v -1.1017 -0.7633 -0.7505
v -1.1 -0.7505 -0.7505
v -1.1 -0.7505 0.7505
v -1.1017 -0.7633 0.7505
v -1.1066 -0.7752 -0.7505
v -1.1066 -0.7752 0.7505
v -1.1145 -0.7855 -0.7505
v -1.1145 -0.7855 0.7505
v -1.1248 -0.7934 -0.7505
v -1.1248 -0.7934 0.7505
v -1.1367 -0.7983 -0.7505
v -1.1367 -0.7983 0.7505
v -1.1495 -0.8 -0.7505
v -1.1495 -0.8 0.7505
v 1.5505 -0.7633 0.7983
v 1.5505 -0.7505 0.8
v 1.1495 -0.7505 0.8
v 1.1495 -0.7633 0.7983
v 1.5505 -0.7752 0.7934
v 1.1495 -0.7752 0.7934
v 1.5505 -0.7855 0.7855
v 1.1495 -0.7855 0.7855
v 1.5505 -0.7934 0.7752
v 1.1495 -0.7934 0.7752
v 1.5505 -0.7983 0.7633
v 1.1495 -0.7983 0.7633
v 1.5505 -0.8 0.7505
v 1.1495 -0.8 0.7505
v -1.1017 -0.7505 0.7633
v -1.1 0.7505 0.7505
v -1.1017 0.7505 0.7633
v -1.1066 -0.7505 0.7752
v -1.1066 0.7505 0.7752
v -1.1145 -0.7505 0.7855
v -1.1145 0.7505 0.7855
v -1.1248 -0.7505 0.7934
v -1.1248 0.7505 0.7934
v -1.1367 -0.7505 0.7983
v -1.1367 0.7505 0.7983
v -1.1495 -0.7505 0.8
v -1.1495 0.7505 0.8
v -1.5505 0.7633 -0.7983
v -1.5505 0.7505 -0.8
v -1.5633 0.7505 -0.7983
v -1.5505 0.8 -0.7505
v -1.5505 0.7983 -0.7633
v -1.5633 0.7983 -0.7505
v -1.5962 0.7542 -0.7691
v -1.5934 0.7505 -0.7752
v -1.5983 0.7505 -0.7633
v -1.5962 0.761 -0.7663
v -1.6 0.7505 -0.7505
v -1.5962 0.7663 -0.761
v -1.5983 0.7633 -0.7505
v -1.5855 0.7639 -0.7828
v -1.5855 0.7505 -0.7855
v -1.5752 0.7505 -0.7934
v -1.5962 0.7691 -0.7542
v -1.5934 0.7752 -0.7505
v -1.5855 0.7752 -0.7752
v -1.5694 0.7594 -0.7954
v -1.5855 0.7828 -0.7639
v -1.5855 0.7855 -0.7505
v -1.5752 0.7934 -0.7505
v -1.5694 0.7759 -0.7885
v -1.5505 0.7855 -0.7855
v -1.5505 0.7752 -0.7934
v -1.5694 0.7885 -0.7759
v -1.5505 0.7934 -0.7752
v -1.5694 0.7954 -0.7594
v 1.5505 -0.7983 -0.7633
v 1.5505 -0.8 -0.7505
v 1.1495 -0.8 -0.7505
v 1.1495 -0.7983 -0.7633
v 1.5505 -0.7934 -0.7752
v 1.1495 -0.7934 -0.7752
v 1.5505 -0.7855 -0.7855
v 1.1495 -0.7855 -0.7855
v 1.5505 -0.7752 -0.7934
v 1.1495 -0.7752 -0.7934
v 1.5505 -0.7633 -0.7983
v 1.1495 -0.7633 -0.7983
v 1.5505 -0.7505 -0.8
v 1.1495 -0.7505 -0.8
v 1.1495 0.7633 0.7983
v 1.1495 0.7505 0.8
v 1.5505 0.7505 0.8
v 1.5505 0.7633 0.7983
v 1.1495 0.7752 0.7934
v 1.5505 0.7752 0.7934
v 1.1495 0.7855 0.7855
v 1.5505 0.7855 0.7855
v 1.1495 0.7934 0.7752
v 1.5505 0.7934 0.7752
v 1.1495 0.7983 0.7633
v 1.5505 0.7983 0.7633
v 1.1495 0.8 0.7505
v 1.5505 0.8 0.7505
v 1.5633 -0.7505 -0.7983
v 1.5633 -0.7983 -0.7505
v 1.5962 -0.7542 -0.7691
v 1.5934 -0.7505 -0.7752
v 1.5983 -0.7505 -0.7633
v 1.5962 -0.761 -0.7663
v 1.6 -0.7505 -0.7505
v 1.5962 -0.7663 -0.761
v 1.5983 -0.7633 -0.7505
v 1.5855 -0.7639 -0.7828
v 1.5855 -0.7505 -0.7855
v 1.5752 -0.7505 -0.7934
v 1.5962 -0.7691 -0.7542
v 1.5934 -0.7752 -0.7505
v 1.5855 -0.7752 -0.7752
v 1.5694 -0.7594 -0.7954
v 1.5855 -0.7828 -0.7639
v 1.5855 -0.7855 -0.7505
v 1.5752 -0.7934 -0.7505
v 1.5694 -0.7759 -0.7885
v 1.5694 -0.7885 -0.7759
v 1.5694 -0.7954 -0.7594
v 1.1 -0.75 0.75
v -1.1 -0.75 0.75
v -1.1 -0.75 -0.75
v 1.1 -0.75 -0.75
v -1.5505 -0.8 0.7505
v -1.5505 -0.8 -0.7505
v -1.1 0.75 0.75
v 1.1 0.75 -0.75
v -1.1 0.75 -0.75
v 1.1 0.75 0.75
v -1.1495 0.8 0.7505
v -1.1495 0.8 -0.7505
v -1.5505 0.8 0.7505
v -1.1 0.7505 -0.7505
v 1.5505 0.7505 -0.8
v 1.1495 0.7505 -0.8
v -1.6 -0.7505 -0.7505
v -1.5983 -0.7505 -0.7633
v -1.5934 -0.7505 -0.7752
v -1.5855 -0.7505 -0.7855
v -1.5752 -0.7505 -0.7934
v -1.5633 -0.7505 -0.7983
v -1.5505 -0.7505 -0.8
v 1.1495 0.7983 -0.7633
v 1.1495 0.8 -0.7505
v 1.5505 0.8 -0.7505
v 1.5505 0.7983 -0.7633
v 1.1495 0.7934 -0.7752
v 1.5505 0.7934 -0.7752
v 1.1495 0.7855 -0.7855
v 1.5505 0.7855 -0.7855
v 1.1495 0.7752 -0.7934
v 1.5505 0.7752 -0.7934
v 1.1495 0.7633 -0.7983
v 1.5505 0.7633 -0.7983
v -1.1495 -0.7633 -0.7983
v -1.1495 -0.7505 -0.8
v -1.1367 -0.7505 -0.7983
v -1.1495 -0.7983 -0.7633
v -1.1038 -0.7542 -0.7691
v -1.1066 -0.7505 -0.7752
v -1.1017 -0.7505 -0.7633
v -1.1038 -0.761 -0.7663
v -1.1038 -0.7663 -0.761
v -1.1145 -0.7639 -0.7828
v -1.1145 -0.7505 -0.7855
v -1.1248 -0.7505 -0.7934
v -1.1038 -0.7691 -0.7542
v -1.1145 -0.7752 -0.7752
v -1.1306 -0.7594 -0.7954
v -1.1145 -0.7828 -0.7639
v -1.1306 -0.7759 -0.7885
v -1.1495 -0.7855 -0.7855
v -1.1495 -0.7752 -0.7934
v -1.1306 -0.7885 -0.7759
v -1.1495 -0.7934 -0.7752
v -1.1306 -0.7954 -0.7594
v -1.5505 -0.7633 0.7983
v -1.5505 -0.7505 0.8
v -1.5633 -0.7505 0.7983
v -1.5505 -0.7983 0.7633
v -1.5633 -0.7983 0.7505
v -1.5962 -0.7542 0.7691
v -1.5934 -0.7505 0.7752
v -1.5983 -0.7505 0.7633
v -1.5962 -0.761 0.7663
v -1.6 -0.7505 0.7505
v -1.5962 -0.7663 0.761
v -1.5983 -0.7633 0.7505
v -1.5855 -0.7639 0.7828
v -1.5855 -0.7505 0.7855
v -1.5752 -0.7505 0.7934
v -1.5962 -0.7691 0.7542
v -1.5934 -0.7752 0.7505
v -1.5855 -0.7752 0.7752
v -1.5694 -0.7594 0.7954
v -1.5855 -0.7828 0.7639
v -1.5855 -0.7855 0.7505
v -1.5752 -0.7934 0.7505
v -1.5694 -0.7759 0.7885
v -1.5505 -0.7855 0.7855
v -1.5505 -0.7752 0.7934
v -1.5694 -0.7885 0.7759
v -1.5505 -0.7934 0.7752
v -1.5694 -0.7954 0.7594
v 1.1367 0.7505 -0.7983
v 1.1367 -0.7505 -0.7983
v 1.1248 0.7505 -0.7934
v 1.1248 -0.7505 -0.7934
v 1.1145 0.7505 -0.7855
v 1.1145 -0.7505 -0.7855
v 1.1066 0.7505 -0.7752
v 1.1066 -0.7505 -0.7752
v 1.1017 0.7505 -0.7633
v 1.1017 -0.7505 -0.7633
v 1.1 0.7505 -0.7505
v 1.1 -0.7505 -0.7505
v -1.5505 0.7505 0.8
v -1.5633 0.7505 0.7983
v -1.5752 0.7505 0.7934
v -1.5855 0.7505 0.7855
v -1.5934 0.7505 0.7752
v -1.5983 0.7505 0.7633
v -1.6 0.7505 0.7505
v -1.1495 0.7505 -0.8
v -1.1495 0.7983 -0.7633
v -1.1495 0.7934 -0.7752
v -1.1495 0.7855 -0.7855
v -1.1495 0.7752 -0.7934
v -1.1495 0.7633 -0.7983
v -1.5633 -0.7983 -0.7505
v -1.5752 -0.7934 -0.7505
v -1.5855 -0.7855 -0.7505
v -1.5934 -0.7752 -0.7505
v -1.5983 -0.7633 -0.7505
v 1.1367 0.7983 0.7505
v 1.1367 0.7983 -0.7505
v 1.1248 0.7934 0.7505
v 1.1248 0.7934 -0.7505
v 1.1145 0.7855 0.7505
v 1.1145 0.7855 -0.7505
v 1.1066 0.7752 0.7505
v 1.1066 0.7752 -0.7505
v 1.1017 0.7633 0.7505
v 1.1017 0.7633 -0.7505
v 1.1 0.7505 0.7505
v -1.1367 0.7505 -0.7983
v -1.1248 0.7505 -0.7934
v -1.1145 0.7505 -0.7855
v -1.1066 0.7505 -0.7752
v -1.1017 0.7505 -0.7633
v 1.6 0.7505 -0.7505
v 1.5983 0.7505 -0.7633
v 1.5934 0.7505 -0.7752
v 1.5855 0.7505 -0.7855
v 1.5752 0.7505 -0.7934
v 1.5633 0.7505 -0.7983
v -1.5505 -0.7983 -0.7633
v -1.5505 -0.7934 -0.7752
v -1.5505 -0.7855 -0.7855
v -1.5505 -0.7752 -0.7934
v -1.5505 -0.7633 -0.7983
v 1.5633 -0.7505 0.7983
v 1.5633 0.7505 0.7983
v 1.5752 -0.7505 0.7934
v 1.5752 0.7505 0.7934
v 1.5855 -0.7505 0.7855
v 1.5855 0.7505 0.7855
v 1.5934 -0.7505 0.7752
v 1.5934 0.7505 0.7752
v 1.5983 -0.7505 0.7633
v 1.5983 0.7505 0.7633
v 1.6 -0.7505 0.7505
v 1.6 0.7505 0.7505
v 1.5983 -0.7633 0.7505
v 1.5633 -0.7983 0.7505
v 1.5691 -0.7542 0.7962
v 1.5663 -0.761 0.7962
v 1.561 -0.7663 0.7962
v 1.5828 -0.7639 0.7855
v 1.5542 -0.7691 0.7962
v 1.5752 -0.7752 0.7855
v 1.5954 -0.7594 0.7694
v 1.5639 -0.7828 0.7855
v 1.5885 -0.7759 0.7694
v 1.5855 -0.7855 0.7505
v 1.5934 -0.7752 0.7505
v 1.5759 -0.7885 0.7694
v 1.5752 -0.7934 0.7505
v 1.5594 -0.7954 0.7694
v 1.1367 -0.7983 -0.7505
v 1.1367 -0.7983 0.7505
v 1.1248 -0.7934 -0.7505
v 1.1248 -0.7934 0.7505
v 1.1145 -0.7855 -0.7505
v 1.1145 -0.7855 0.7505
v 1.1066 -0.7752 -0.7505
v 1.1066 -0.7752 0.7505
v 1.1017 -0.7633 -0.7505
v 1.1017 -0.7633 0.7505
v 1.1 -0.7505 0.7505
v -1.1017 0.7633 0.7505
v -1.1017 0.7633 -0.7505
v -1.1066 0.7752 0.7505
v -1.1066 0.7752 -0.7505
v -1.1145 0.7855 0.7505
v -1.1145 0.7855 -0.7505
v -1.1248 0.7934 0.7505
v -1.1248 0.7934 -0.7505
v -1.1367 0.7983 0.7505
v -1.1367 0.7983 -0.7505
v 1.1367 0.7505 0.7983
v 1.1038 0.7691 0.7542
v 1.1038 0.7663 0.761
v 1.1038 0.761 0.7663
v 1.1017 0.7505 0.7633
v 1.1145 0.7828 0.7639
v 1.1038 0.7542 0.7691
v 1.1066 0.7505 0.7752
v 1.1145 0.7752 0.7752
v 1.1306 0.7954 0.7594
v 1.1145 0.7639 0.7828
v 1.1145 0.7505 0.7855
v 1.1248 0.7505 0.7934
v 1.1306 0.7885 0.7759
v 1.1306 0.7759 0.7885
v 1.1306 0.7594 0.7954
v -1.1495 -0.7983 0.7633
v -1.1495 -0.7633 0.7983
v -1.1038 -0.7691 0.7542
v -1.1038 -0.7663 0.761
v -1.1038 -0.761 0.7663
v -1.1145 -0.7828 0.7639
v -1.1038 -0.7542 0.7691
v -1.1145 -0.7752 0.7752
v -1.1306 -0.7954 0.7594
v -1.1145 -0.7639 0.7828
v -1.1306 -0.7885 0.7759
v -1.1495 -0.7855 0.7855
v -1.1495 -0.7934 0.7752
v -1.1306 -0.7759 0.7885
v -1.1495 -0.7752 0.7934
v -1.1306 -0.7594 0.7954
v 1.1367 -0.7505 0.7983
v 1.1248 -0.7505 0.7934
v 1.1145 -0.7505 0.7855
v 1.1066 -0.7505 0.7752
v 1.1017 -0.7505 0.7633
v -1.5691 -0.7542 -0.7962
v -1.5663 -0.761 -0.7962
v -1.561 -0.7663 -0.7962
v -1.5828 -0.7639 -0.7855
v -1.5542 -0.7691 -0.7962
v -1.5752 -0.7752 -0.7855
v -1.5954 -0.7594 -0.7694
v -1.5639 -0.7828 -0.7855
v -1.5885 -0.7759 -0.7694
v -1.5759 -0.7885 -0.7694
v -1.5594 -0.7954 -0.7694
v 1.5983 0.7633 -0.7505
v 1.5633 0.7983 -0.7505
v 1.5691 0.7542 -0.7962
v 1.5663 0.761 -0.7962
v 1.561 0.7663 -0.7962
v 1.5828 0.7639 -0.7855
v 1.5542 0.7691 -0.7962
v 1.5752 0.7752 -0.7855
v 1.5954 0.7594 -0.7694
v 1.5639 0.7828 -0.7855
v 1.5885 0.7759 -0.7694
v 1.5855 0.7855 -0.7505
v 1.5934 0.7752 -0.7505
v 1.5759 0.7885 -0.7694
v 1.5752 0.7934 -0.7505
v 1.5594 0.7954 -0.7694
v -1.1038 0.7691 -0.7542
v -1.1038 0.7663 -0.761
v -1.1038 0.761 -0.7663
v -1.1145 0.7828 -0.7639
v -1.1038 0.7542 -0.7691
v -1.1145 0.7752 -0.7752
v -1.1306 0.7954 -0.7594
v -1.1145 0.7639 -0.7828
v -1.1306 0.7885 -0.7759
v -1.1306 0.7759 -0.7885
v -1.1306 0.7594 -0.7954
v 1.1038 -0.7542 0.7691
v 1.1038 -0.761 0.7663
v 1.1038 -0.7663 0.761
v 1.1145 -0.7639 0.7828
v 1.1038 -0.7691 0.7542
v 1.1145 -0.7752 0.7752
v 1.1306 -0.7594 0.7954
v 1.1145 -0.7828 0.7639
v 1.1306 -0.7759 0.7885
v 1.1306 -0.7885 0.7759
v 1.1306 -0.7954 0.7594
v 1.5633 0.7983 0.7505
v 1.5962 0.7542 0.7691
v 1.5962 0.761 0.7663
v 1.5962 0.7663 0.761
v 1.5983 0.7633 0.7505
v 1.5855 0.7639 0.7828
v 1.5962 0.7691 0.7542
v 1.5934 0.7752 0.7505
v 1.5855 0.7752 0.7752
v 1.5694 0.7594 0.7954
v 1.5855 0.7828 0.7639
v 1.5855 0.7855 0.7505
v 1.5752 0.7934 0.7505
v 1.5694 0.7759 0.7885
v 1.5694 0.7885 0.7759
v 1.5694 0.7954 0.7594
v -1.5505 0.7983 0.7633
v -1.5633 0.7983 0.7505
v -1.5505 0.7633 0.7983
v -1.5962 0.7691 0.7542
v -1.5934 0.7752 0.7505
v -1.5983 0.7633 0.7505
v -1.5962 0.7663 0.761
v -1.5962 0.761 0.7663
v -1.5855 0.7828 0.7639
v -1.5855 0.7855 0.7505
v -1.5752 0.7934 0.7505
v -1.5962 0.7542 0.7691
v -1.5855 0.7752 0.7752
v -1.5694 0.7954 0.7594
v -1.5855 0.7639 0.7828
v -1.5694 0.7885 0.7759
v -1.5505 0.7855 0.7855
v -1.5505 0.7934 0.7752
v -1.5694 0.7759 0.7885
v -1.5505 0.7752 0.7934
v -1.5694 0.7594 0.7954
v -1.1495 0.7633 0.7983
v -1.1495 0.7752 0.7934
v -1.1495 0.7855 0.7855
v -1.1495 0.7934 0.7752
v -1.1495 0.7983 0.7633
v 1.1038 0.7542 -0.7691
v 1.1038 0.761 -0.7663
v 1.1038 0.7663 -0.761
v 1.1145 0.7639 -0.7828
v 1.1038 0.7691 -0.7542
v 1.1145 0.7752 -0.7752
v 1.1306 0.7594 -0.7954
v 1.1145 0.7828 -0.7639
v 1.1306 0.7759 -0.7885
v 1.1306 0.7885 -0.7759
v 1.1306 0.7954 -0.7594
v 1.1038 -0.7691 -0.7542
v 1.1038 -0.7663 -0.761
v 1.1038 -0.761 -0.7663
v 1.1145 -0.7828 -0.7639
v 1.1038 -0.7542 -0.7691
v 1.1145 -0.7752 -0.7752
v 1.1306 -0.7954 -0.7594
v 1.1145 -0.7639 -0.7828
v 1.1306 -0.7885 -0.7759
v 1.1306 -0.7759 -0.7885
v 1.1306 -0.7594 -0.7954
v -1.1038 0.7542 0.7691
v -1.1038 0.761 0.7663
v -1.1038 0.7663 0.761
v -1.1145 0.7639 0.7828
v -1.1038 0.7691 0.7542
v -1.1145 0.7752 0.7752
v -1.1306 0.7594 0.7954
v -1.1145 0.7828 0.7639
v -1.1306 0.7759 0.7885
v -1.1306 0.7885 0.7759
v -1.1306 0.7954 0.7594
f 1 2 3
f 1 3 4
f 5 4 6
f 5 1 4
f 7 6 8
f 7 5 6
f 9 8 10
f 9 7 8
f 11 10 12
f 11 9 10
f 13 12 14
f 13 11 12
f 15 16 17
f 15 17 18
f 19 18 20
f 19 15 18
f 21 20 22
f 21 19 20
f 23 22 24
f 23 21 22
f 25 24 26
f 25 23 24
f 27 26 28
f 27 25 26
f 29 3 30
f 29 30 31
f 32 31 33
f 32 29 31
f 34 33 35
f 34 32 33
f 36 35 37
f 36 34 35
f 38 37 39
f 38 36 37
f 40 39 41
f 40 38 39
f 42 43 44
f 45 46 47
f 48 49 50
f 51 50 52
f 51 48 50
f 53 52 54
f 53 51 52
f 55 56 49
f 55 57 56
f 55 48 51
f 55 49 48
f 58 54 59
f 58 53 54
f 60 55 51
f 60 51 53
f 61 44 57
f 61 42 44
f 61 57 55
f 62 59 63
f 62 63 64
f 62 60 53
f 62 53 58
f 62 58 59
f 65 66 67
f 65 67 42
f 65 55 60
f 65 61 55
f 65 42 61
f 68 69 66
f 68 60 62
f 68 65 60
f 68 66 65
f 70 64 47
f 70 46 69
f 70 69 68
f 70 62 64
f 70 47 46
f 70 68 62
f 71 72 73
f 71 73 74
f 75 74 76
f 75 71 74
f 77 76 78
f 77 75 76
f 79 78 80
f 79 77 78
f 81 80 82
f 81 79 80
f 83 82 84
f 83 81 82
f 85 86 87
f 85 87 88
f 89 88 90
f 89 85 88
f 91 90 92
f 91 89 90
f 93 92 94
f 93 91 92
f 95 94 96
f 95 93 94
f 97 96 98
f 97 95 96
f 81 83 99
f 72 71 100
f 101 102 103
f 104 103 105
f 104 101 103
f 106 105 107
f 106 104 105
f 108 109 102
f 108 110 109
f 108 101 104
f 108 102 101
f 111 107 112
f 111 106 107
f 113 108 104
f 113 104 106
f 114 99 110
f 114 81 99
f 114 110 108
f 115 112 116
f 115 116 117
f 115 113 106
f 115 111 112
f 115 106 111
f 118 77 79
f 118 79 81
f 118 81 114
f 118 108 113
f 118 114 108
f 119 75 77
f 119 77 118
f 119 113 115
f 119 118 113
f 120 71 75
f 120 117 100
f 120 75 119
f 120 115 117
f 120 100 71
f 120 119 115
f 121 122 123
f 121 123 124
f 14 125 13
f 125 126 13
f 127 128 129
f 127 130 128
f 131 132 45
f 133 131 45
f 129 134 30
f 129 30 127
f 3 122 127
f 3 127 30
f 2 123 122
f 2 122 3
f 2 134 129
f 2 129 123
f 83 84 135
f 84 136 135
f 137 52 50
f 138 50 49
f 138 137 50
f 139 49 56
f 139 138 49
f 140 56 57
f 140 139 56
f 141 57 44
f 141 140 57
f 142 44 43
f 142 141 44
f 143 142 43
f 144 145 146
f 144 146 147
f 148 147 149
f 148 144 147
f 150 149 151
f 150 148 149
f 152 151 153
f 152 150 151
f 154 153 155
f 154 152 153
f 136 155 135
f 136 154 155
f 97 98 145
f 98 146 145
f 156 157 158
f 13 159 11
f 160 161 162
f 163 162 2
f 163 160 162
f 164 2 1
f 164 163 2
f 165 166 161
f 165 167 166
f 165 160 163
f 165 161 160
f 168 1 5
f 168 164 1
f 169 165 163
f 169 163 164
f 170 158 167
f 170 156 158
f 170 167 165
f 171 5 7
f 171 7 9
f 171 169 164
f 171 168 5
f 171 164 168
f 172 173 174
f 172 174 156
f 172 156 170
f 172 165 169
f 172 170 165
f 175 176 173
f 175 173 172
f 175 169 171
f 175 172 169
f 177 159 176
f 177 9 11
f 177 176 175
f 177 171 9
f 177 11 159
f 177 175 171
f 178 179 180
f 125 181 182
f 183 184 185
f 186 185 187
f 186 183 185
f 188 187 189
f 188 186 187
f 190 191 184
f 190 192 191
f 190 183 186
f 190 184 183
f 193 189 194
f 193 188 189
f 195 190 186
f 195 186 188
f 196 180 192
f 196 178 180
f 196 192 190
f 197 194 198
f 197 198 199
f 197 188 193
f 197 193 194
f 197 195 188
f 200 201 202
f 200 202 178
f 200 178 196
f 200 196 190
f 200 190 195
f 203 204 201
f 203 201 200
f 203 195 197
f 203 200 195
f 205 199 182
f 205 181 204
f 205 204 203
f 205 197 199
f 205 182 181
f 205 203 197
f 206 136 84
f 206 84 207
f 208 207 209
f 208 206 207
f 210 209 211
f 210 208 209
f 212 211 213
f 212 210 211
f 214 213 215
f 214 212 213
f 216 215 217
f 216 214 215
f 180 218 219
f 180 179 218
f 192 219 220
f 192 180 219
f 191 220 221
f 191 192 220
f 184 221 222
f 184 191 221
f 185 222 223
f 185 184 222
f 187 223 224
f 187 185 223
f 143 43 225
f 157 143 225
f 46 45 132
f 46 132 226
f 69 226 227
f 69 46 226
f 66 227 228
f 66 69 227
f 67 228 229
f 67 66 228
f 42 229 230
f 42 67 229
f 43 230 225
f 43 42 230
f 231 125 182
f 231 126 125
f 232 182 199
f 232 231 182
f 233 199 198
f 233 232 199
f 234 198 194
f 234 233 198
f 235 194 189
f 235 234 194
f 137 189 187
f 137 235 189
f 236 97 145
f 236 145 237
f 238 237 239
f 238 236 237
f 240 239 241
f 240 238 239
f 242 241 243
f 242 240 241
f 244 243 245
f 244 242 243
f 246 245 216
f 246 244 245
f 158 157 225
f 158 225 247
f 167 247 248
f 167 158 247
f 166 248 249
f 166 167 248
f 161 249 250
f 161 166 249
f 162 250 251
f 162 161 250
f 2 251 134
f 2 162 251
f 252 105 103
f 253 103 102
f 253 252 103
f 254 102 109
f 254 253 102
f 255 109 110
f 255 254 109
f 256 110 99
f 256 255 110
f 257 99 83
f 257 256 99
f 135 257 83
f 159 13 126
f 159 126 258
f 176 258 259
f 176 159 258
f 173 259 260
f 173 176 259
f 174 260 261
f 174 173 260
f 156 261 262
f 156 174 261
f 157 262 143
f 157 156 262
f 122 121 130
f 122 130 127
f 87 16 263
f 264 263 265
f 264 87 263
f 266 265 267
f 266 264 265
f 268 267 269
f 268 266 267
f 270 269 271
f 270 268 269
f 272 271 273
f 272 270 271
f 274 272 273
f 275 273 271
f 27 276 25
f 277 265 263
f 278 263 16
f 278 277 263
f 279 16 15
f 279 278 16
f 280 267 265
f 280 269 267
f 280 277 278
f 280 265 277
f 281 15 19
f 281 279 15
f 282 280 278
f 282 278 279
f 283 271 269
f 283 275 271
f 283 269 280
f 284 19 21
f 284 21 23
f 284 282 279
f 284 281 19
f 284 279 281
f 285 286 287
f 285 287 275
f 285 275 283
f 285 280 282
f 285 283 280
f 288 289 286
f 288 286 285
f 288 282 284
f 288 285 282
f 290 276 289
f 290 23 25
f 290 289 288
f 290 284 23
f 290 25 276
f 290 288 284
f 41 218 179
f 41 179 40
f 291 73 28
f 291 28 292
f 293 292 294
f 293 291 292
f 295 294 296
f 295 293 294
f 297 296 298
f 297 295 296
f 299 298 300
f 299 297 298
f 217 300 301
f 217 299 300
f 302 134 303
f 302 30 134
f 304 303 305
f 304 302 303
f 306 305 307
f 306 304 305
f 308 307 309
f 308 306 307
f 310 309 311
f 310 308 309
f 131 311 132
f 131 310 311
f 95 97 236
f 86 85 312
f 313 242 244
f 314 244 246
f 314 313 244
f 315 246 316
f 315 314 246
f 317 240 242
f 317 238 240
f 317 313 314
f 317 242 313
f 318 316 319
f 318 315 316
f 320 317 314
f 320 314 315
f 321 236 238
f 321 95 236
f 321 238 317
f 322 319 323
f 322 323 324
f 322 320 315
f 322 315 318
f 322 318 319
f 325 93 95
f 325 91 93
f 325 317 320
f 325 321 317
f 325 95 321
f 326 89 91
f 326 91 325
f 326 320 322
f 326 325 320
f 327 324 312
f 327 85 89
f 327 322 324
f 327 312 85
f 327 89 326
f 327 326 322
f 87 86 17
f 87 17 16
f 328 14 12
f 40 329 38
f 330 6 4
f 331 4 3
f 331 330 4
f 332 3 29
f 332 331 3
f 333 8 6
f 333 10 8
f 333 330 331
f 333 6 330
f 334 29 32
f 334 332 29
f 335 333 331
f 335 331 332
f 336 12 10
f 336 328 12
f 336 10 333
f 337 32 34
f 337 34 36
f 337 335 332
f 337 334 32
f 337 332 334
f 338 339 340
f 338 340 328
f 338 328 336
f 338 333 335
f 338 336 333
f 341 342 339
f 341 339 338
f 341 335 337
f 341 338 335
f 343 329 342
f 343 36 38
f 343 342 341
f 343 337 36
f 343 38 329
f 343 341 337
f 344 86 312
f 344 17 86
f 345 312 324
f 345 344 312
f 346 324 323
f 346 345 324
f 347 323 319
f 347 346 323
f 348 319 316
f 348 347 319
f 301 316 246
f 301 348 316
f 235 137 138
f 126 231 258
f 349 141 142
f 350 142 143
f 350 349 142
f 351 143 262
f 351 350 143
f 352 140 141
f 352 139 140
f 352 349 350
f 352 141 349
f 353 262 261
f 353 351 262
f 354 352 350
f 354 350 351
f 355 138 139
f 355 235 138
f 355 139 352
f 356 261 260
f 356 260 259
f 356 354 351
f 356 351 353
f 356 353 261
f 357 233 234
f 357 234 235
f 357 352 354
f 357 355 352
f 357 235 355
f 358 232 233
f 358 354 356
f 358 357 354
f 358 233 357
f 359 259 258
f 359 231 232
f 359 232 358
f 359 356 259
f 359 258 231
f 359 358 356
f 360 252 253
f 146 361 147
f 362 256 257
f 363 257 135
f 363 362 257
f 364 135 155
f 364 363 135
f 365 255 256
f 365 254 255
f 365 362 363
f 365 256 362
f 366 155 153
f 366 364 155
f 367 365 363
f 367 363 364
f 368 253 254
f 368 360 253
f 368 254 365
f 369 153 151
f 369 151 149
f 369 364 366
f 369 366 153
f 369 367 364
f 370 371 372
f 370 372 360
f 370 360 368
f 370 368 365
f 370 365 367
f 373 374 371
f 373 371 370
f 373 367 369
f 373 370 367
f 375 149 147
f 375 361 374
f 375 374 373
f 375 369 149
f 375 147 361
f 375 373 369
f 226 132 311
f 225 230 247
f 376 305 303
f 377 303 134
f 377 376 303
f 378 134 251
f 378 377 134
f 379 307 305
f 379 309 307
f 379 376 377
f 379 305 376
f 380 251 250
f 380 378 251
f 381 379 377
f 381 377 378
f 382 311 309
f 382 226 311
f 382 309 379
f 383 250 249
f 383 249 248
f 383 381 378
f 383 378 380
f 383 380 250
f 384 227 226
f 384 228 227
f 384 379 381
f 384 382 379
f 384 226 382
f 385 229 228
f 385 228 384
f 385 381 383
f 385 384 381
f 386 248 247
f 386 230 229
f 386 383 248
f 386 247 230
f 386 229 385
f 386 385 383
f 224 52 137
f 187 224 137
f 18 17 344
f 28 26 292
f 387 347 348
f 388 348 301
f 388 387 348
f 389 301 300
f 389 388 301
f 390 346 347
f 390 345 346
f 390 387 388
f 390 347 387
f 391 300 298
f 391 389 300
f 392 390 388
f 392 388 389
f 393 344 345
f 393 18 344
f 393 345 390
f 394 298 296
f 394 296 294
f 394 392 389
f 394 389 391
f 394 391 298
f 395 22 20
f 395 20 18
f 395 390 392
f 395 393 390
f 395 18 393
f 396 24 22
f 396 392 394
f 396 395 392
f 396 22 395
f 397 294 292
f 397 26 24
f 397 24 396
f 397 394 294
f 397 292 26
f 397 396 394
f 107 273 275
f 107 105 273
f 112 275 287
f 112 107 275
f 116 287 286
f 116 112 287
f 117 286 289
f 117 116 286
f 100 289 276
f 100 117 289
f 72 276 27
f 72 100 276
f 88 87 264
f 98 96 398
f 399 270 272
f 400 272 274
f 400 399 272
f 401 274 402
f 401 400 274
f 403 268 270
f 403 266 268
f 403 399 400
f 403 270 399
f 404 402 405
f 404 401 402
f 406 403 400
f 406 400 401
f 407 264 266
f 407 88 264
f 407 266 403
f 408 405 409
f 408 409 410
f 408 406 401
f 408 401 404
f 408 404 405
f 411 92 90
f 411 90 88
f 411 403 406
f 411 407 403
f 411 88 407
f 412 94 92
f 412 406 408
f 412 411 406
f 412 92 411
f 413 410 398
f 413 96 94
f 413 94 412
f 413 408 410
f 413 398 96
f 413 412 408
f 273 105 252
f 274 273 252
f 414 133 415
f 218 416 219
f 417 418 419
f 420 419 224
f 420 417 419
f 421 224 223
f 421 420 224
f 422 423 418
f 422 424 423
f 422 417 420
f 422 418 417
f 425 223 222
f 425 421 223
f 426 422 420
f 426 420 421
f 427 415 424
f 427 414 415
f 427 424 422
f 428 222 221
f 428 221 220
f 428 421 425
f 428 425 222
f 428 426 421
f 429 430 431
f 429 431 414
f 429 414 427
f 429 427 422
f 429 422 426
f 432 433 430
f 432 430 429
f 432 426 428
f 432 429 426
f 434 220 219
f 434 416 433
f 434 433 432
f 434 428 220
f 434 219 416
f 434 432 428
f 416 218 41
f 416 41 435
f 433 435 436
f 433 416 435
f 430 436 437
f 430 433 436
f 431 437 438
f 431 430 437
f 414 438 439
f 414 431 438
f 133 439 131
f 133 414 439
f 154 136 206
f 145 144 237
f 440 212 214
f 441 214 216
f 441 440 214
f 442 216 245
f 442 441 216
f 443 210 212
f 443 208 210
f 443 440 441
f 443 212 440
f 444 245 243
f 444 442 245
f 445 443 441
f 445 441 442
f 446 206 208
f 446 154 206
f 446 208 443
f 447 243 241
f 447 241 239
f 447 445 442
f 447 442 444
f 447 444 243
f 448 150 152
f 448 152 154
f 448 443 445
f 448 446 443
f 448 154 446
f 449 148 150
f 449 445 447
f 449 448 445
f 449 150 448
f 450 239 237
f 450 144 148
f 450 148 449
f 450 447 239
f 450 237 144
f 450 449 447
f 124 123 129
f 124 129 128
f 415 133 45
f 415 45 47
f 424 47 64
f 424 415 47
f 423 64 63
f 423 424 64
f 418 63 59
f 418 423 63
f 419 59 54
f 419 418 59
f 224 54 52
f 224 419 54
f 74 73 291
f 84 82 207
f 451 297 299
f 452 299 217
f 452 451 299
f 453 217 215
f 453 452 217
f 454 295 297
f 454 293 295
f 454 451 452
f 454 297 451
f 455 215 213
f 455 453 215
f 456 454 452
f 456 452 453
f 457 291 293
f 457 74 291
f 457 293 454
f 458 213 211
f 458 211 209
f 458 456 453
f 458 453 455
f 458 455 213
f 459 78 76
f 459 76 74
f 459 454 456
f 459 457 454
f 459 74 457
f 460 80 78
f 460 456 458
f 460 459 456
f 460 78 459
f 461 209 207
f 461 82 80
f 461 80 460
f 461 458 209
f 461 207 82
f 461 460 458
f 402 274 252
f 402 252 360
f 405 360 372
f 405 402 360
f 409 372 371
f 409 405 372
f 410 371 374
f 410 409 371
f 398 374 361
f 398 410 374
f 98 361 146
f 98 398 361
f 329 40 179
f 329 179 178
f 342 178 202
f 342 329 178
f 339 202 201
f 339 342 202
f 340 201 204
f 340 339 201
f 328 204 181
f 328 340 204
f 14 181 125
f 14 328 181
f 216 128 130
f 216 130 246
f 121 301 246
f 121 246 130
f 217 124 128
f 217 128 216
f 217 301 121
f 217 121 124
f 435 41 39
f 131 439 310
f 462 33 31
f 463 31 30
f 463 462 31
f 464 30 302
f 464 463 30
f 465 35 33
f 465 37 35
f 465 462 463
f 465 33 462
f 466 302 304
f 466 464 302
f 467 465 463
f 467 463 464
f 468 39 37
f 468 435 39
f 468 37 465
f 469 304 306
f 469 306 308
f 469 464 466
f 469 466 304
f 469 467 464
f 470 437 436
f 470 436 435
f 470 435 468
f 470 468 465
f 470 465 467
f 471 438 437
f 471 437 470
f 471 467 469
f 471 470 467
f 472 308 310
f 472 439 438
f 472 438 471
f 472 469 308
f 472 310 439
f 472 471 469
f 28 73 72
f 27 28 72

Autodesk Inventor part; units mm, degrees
ref_plane "YZ Plane" through (0, 0, 0) normal (1, 0, 0) x (0, 1, 0)
ref_plane "XZ Plane" through (0, 0, 0) normal (0, 1, 0) x (-1, 0, 0)
ref_plane "XY Plane" through (0, 0, 0) normal (0, 0, 1) x (1, 0, 0)
sketch "Sketch1" plane through (0, 0, 0) normal (0, 0, 1) x (1, 0, 0)
  line L0 (1.6, 0.8) -> (-1.6, 0.8)
  line L1 (-1.6, 0.8) -> (-1.6, -0.8)
  line L2 (-1.6, -0.8) -> (1.6, -0.8)
  line L3 (1.6, -0.8) -> (1.6, 0.8)
  line L4 (1.6, 0.8) -> (-1.6, -0.8) construction
  line L5 (-1.6, 0.8) -> (1.6, -0.8) construction
  point P0 (0, 0)
  point P1 (0, 0)
  point P2 (0, 0)
  dimension "d0" = 3.2
  dimension "d1" = 1.6
extrude "Extrusion1" add sketch "Sketch1" along normal mid plane 1.6
sketch "Sketch2" plane through (0, 0, 0.8) normal (0, 0, 1) x (-1, 0, 0)
  line L0 (1.1, 0.4493) -> (1.1, -0.8)
  line L1 (-1.1, 0.8) -> (-1.1, -0.45)
  line L2 (-1.1, 0.8) -> (1.1, 0.8)
  line L3 (1.1, 0.8) -> (1.1, -0.8)
  line L4 (1.1, -0.8) -> (-1.1, -0.8)
  line L5 (-1.1, -0.8) -> (-1.1, 0.8)
  line L6 (-1.6, -0.8) -> (1.6, -0.8) projected
  line L7 (1.6, 0.8) -> (-1.6, 0.8) projected
  line L8 (1.6, -0.8) -> (1.6, 0.8) projected
  line L9 (-1.6, 0.8) -> (-1.6, -0.8) projected
  point P0 (0, 0)
  dimension "d11" = 0.5
  dimension "d12" = 0.5
extrude "Extrusion2" cut sketch "Sketch2" against normal blind 0.05 contours L0 L4 L5 L1 L2 L3
mirror "Mirror1" about plane through (0, 0, 0) normal (0, 0, 1) of "Extrusion2"
sketch "Sketch3" plane through (1.6, -0.8, -0.8) normal (0, -1, 0) x (1, 0, 0)
  line L0 (-2.7, 1.55) -> (-0.5, 1.55)
  line L1 (-0.5, 1.55) -> (-0.5, 0.05)
  line L2 (-0.5, 0.05) -> (-2.7, 0.05)
  line L3 (-2.7, 0.05) -> (-2.7, 1.55)
  point P0 (-1.6, 0.8)
extrude "Extrusion3" cut sketch "Sketch3" against normal blind 0.05
mirror "Mirror2" about plane through (0, 0, 0) normal (0, 1, 0) of "Extrusion3"
fillet "Fillet1" radius 0.05 24 edges at (1.35, 0.8, 0.8) (1.6, 0.8, 0) (1.35, 0.8, -0.8) (1.35, -0.8, -0.8) (1.6, -0.8, 0) (1.35, -0.8, 0.8) (-1.35, -0.8, 0.8) (-1.6, -0.8, 0) (-1.35, -0.8, -0.8) (1.6, 0, -0.8) (1.6, 0, 0.8) (-1.35, 0.8, 0.8) (-1.6, 0, 0.8) (-1.35, 0.8, -0.8) (-1.6, 0.8, 0) (-1.6, 0, -0.8) (-1.1, 0.8, 0) (-1.1, 0, 0.8) (-1.1, -0.8, 0) (-1.1, 0, -0.8) (1.1, 0.8, 0) (1.1, 0, -0.8) (1.1, -0.8, 0) (1.1, 0, 0.8)
properties part number "C1206C103KFRACTU"
